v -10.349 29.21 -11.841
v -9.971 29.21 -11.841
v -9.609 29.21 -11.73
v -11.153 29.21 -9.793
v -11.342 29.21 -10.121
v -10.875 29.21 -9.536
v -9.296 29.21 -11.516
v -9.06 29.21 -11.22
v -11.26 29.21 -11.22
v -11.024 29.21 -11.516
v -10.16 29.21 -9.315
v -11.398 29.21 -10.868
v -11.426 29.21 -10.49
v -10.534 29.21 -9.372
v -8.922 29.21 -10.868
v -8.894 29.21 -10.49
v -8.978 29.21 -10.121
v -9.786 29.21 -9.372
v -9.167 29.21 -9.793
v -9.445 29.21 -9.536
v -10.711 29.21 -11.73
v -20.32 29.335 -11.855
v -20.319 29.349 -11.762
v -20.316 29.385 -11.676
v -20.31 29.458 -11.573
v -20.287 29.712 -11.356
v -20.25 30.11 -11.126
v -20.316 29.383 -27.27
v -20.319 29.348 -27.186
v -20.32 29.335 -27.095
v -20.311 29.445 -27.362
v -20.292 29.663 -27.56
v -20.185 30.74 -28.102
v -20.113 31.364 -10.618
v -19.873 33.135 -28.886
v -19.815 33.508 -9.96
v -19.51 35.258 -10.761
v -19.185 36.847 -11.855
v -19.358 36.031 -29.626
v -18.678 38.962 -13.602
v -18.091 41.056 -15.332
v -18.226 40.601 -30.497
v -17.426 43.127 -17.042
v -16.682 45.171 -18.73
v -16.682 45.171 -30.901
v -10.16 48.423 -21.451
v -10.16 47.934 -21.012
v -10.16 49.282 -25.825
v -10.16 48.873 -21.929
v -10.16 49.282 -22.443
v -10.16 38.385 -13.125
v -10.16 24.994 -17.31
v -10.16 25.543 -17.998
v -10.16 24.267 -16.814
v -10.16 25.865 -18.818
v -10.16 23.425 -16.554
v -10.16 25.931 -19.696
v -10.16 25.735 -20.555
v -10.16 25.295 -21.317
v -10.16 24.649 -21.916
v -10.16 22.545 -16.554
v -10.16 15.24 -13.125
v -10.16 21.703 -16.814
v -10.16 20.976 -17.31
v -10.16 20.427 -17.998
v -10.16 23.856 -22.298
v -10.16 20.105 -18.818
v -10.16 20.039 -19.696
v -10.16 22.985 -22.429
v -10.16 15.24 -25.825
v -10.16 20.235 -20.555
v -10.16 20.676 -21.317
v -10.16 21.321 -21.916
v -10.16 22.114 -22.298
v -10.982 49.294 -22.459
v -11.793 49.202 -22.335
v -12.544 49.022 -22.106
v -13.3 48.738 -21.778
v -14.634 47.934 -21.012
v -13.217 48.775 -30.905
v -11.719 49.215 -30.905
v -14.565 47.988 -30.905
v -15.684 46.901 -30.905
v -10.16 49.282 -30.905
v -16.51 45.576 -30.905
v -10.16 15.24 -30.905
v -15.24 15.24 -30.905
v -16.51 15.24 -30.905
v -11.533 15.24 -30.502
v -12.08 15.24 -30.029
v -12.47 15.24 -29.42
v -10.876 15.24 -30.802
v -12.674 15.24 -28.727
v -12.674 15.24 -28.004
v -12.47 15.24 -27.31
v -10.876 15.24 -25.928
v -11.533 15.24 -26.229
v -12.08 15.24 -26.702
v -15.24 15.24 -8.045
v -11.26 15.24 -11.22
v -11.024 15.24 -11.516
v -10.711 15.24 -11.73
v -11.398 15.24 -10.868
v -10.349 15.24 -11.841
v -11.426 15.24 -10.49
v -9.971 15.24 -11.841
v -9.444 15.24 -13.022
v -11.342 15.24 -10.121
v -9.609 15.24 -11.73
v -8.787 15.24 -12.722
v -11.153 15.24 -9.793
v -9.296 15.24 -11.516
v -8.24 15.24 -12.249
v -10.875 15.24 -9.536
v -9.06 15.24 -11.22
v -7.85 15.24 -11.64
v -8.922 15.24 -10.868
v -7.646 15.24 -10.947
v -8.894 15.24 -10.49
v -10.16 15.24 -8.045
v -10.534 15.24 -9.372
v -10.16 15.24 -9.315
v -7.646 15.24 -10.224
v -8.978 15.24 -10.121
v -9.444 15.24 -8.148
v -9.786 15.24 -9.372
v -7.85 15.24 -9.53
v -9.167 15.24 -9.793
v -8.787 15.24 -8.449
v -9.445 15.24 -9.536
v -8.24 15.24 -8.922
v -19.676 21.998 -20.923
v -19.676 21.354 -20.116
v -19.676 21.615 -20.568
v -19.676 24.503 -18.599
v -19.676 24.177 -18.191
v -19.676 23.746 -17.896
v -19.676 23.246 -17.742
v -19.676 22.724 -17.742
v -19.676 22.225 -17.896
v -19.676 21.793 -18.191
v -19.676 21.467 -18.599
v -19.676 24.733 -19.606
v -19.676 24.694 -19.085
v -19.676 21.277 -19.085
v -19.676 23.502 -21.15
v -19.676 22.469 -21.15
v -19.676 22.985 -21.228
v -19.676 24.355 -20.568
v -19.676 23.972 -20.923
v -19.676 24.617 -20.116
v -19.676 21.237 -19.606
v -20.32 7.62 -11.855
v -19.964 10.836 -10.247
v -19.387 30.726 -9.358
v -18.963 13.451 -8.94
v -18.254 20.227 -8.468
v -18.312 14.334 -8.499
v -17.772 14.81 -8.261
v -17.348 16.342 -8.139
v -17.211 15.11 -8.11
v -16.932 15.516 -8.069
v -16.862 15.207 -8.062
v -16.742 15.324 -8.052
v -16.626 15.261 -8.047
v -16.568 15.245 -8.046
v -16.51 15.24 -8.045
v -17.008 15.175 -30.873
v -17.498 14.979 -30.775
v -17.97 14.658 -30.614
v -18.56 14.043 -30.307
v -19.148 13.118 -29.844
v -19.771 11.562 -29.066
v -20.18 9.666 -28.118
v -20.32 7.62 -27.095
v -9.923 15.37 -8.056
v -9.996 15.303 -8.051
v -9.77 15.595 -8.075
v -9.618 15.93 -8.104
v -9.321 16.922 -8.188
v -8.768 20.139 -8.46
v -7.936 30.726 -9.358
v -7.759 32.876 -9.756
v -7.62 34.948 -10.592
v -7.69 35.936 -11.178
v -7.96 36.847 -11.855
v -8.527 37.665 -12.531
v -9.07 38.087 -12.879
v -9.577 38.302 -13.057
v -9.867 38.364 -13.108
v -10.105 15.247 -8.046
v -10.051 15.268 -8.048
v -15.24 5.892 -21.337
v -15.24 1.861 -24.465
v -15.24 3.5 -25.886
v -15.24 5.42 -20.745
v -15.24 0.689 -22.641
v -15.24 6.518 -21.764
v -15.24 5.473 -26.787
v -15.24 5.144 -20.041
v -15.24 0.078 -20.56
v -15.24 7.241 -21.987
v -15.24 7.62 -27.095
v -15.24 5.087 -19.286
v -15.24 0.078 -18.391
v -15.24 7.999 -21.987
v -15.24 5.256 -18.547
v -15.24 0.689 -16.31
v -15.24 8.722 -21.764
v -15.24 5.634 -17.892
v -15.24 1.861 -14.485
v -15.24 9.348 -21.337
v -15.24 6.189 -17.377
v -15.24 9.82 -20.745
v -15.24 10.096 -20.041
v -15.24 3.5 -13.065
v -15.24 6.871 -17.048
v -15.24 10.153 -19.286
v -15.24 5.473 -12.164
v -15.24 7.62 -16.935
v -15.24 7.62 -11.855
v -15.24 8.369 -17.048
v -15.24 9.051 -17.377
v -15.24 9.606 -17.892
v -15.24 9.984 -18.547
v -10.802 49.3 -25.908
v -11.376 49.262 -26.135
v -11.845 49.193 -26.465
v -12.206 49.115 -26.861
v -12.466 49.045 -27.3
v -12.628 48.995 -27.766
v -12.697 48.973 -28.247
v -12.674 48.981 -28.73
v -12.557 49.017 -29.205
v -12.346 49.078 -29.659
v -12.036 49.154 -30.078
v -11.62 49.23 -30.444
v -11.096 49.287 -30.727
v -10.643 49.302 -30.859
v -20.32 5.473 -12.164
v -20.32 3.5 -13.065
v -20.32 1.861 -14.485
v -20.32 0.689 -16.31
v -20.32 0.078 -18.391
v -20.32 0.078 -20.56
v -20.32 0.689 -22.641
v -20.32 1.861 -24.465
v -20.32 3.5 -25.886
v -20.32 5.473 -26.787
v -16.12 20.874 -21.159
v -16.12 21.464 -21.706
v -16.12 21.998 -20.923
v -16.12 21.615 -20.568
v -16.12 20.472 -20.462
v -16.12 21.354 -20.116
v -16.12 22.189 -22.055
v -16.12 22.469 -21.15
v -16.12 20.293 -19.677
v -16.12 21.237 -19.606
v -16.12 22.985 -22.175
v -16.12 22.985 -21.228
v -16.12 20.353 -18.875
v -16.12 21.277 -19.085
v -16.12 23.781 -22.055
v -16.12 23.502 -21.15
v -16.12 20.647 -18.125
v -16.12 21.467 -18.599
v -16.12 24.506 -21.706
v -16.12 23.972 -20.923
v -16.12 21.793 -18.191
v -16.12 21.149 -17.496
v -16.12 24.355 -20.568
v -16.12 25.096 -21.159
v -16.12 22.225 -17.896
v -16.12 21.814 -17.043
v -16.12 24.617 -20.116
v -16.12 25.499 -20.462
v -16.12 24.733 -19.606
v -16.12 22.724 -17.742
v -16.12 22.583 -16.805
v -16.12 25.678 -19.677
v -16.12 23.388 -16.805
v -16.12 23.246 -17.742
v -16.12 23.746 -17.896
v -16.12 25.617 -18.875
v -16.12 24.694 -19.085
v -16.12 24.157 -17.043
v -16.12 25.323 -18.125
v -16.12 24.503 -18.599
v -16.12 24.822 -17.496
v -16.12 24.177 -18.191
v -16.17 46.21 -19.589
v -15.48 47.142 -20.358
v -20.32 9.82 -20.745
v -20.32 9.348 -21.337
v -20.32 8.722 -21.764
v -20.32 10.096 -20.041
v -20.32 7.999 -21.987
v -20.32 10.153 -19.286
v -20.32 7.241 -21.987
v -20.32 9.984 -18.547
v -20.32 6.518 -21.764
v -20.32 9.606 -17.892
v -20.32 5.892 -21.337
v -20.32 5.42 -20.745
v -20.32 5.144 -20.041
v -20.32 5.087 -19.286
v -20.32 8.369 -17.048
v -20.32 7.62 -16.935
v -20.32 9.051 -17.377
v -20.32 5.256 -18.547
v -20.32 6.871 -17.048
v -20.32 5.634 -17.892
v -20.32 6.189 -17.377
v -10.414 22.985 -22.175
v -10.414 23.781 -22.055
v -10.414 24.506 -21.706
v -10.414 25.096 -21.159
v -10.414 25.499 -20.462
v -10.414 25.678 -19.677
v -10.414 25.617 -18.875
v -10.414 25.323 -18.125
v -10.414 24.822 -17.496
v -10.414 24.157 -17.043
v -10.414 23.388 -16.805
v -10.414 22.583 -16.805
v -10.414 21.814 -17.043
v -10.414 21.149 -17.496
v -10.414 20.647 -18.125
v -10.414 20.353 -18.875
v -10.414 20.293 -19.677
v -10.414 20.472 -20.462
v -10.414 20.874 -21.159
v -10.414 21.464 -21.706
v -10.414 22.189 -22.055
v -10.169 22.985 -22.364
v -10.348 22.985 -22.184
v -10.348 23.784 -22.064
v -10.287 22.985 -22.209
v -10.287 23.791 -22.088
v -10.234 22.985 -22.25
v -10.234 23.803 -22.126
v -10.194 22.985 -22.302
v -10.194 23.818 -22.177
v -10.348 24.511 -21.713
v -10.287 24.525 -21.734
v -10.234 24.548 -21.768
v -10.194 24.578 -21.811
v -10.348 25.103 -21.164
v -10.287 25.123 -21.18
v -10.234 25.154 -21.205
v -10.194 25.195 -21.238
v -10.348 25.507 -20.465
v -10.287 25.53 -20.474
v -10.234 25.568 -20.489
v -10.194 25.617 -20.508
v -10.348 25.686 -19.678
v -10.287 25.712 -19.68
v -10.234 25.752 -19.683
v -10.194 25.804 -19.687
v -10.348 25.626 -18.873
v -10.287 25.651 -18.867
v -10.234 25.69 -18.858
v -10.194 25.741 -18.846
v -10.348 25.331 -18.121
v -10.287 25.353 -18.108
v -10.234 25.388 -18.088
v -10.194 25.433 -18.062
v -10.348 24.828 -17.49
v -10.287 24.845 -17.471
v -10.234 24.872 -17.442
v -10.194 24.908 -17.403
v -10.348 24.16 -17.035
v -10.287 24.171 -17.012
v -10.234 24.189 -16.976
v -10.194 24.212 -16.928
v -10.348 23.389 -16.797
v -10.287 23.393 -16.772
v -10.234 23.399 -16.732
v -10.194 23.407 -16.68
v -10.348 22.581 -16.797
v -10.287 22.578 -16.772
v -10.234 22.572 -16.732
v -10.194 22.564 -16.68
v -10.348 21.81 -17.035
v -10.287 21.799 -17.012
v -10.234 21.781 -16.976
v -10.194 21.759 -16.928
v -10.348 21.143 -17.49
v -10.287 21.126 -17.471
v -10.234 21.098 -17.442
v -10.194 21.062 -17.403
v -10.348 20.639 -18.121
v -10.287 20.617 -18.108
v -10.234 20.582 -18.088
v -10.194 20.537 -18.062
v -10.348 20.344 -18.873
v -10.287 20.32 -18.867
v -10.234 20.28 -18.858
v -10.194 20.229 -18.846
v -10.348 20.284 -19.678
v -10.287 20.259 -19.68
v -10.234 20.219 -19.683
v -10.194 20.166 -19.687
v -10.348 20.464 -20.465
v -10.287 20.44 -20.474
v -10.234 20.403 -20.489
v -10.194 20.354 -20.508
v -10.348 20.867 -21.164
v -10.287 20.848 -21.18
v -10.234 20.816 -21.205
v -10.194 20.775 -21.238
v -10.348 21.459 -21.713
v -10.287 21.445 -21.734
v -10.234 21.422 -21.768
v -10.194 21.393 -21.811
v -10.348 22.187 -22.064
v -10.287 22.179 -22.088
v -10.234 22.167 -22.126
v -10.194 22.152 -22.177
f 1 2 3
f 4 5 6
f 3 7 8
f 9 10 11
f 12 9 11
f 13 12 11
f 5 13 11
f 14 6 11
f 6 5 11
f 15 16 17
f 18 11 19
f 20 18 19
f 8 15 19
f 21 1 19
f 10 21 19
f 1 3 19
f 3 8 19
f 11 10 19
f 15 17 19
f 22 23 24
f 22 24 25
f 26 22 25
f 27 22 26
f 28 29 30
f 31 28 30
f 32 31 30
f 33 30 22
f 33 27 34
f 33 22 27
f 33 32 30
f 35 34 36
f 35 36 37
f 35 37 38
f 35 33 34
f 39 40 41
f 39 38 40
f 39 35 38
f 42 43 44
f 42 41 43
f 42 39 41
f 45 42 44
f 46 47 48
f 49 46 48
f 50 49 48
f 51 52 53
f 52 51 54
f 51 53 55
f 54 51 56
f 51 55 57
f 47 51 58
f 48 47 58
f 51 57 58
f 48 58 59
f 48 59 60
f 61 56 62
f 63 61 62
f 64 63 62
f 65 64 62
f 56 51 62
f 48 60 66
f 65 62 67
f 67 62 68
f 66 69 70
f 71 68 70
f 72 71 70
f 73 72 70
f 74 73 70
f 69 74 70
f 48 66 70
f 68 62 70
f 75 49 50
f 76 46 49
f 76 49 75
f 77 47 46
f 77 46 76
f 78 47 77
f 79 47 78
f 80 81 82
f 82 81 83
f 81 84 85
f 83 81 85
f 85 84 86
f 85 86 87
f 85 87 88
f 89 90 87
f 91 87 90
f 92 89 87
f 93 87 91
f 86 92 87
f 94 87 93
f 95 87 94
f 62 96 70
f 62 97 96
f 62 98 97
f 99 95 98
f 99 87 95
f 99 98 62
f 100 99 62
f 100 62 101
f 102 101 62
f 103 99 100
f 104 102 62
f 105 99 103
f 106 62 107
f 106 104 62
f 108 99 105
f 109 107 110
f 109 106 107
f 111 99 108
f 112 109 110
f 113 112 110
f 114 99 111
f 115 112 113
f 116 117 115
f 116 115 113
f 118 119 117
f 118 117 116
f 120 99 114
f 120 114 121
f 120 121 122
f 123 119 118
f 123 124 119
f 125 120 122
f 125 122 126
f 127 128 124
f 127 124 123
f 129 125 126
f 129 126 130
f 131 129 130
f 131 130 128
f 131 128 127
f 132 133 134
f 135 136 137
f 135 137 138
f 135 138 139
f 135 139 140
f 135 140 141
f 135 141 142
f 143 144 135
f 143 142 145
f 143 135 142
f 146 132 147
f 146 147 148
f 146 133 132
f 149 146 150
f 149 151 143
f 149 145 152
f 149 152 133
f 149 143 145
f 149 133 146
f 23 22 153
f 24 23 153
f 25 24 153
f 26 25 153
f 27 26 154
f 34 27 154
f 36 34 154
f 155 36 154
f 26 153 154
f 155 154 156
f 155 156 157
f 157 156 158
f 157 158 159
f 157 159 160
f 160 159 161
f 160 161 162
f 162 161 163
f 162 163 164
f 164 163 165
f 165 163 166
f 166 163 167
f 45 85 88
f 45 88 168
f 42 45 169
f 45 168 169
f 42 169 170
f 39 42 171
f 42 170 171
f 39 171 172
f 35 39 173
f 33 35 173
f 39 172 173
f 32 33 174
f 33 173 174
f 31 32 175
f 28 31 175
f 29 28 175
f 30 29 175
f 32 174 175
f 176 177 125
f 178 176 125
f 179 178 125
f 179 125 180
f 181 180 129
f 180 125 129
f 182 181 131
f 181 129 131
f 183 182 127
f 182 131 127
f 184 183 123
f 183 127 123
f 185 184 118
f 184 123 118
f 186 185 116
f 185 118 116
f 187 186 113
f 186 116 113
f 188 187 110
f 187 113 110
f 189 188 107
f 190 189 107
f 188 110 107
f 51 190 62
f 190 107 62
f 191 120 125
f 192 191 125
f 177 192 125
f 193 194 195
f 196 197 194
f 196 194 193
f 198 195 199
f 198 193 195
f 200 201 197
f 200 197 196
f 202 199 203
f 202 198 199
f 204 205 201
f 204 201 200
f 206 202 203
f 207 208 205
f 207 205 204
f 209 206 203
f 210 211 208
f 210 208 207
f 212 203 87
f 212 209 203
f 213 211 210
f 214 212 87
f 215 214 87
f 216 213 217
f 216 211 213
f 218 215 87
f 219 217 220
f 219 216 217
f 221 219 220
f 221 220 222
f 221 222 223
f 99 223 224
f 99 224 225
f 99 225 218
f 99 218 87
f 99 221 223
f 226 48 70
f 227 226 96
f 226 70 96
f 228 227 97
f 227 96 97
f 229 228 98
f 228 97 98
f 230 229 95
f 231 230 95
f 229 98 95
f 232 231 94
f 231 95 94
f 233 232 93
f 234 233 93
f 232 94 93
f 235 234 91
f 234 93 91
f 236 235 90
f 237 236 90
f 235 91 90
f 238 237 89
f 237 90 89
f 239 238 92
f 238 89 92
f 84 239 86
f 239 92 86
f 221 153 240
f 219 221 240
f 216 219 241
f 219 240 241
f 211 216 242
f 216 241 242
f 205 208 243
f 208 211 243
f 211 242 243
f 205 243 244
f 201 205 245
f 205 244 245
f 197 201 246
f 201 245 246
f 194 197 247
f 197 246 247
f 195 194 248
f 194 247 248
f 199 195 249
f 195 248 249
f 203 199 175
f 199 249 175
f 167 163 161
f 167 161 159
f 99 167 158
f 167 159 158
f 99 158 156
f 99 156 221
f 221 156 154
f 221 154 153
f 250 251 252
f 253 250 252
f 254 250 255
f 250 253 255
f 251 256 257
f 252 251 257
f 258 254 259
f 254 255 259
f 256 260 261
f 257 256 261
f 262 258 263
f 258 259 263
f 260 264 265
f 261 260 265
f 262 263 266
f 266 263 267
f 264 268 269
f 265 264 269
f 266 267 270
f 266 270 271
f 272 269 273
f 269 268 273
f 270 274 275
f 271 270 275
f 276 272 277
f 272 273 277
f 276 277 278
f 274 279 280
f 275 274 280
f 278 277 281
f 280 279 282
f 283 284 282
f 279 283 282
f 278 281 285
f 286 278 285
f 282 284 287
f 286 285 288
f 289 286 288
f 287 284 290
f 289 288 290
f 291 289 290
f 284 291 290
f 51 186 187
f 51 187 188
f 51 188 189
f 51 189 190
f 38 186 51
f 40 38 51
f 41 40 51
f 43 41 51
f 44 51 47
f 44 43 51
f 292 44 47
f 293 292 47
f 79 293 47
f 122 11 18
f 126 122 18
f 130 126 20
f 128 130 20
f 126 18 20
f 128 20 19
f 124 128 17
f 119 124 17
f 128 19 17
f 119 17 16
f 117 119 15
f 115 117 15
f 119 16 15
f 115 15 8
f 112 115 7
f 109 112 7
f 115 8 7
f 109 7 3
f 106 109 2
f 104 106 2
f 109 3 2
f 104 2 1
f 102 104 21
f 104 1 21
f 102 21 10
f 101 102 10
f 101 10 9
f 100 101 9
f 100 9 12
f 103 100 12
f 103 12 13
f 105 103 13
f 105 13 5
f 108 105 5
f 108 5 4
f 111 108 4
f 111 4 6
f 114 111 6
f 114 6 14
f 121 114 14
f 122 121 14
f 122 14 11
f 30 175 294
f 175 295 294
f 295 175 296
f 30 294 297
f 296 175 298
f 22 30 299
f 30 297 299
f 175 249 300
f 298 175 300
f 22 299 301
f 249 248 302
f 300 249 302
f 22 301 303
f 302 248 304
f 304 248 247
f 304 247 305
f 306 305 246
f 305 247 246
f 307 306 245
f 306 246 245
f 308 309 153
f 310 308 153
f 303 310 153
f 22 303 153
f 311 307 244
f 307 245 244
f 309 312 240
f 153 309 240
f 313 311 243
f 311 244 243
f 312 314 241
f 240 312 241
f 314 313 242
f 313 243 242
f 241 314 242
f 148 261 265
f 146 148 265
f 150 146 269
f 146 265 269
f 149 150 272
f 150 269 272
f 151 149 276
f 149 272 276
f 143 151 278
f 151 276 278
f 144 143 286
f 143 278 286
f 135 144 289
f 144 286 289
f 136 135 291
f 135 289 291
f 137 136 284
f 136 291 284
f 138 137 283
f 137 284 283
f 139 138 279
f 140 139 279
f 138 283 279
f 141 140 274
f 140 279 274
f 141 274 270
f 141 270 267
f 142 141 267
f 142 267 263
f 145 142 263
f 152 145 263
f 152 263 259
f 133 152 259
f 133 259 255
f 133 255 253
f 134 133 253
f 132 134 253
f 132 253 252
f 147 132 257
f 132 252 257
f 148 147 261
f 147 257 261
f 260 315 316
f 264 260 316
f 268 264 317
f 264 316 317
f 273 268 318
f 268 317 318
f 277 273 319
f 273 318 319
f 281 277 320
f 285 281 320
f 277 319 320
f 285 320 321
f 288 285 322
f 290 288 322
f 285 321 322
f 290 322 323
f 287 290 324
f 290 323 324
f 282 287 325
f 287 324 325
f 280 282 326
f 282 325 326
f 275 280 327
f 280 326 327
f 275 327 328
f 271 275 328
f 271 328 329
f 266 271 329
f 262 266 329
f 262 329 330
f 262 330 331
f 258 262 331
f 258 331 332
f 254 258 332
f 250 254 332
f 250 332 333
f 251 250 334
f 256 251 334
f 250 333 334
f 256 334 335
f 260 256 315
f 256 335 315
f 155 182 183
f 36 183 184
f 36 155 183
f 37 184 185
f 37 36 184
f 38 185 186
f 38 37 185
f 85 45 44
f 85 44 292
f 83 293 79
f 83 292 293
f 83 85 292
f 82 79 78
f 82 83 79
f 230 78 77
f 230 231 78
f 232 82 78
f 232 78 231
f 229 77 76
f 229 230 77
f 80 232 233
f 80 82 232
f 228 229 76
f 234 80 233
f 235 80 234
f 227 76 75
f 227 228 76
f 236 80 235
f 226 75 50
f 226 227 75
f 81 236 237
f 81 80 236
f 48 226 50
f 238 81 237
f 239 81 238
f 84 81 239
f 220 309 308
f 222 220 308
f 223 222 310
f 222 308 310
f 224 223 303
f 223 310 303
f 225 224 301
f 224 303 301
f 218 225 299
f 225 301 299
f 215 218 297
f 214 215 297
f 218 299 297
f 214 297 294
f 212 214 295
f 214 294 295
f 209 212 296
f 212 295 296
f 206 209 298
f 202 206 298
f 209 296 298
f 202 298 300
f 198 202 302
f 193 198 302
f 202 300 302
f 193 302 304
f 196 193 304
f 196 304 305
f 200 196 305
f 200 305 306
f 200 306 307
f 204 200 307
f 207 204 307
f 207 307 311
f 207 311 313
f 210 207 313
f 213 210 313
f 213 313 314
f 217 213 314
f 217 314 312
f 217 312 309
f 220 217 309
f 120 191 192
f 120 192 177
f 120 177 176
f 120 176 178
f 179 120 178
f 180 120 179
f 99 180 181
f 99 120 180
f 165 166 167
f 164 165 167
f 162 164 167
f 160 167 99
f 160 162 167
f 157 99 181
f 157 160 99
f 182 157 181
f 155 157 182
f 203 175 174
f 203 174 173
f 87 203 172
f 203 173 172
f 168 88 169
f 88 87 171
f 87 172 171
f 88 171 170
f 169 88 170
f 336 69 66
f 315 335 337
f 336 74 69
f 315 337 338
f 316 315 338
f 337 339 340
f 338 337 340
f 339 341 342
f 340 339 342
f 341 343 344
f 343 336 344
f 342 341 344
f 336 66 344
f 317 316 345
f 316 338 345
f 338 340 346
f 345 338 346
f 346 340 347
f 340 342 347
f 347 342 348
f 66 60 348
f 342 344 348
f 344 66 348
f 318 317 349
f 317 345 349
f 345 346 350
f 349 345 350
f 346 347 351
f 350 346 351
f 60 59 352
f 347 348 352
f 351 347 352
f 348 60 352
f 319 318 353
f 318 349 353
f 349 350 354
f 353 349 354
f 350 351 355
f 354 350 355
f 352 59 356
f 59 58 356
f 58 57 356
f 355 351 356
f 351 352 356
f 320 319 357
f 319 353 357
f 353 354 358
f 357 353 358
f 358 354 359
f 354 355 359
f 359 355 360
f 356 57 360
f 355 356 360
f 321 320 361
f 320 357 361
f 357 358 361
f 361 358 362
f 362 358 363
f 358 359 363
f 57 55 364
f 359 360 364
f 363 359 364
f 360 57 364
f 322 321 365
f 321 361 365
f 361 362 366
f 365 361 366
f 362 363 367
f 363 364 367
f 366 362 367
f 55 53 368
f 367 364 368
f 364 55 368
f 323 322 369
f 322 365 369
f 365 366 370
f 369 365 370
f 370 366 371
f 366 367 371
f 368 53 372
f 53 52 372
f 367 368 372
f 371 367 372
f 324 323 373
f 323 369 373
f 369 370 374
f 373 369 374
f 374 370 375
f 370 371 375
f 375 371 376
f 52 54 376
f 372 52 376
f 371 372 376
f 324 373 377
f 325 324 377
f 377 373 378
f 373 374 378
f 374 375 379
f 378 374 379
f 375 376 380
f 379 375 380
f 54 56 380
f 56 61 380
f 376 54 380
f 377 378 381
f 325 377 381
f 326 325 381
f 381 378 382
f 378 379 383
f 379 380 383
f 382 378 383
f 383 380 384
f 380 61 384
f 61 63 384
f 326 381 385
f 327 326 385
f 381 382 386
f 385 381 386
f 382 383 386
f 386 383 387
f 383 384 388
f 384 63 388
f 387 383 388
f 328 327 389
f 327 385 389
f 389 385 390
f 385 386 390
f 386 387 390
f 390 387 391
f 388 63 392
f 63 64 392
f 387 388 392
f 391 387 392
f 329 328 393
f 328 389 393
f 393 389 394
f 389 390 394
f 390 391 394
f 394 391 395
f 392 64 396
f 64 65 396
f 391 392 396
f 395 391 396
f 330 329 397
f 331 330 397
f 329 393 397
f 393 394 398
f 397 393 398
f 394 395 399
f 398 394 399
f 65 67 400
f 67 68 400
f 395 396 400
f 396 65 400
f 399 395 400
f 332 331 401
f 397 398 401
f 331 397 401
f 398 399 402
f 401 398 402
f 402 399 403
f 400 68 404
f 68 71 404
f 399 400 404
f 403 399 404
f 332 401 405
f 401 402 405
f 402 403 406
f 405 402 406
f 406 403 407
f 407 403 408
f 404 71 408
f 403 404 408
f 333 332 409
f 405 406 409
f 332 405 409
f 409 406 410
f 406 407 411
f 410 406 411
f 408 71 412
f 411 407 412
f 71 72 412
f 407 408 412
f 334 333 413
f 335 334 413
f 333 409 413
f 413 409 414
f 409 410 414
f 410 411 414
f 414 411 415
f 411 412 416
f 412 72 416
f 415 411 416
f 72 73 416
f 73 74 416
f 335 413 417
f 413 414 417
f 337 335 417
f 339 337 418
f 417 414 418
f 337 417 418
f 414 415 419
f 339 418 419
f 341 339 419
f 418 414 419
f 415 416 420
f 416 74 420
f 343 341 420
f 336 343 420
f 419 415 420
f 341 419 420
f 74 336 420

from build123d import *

# Parameters (mm, degrees)
BOSS_EXTRUDE1_DEPTH = 50.8
CUT_EXTRUDE2_START  = -21.59
SKETCH3_R           = 1.27
CUT_EXTRUDE2_DEPTH  = 50.8
CUT_EXTRUDE1_DEPTH  = 50.8
SKETCH4_W           = 10.16
SKETCH4_H           = 15.24
CUT_EXTRUDE3_DEPTH  = 50.8
SKETCH5_R           = 2.54
CUT_EXTRUDE5_DEPTH  = 50.8
CUT_EXTRUDE6_DEPTH  = 32.512
CUT_EXTRUDE7_DEPTH  = 32.512
CUT_EXTRUDE12_START = -10.16
SKETCH14_R          = 2.7
CUT_EXTRUDE12_DEPTH = 9.08
CUT_EXTRUDE9_DEPTH  = 38.608
BOSS_EXTRUDE2_START = -4.2
SKETCH15_R          = 2.7
BOSS_EXTRUDE2_DEPTH = 4.2
FILLET1_R           = 0.254
SKETCH16_R          = 1.7526
CUT_EXTRUDE13_DEPTH = 3.556


with BuildPart() as part:
    # Sketch1 → Boss-Extrude1 (new body)
    with BuildSketch(Plane(origin=(0, 0, 0), x_dir=(1, 0, 0), z_dir=(0, 1, 0))):
        with BuildLine():
            Line((-20.32, 27.095319289), (-20.32, 11.855319289))
            ThreePointArc((-20.32, 11.855319289), (-19.204076836, 9.161242453), (-16.51, 8.045319289))
            Line((-16.51, 8.045319289), (-3.81, 8.045319289))
            ThreePointArc((-3.81, 8.045319289), (-1.115923164, 9.161242453), (0, 11.855319289))
            Line((0, 11.855319289), (0, 27.095319289))
            ThreePointArc((0, 27.095319289), (-1.115923164, 29.789396126), (-3.81, 30.905319289))
            Line((-3.81, 30.905319289), (-16.51, 30.905319289))
            ThreePointArc((-16.51, 30.905319289), (-19.204076836, 29.789396126), (-20.32, 27.095319289))
        make_face()
    extrude(amount=BOSS_EXTRUDE1_DEPTH)

    # Sketch3 → Cut-Extrude2 (cut)
    with BuildSketch(Plane(origin=(0, 50.8, 0), x_dir=(1, 0, 0), z_dir=(0, 1, 0)).offset(CUT_EXTRUDE2_START)):
        with Locations(Location((-10.16, 10.585319289, 0), (0, 0, 270))):
            Circle(SKETCH3_R)
        with Locations(Location((-10.16, 28.365319289, 0), (0, 0, 270))):
            Circle(SKETCH3_R)
    extrude(amount=-CUT_EXTRUDE2_DEPTH, mode=Mode.SUBTRACT)

    # Sketch2 → Cut-Extrude1 (cut)
    with BuildSketch(Plane.ZY.offset(20.32)):
        with BuildLine():
            Line((-27.095319289, 7.62), (-30.905319289, 15.24))
            Line((-30.905319289, 15.24), (-30.905319289, -5.08))
            Line((-30.905319289, -5.08), (-8.045319289, -5.08))
            Line((-8.045319289, -5.08), (-8.045319289, 15.24))
            Line((-8.045319289, 15.24), (-11.855319289, 7.62))
            ThreePointArc((-11.855319289, 7.62), (-19.475319289, 0), (-27.095319289, 7.62))
        make_face()
    extrude(amount=-CUT_EXTRUDE1_DEPTH, mode=Mode.SUBTRACT)

    # Sketch4 → Cut-Extrude3 (cut)
    with BuildSketch(Plane.XY.offset(-8.045319289)):
        with Locations((-10.16, 7.62)):
            Rectangle(SKETCH4_W, SKETCH4_H)
    extrude(amount=-CUT_EXTRUDE3_DEPTH, mode=Mode.SUBTRACT)

    # Sketch5 → Cut-Extrude5 (cut)
    with BuildSketch(Plane.ZY.offset(20.32)):
        with Locations((-19.475319289, 7.62)):
            Circle(SKETCH5_R)
    extrude(amount=-CUT_EXTRUDE5_DEPTH, mode=Mode.SUBTRACT)

    # Sketch6 → Cut-Extrude6 (cut)
    with BuildSketch(Plane.ZY.offset(20.32)):
        with BuildLine():
            Line((-11.855319289, 36.846817341), (-21.012334943, 47.93447962))
            ThreePointArc((-21.012334943, 47.93447962), (-23.733254983, 50.047756788), (-27.095319289, 50.8))
            Line((-27.095319289, 50.8), (-31.52544936, 50.8))
            Line((-31.52544936, 50.8), (-31.52544936, 15.08846866))
            Line((-31.52544936, 15.08846866), (-40.392656277, 51.934271372))
            Line((-40.392656277, 51.934271372), (12.273740193, 71.26134954))
            Line((12.273740193, 71.26134954), (-8.045319289, 15.24))
            Line((-8.045319289, 15.24), (-9.357524517, 30.725540243))
            ThreePointArc((-9.357524517, 30.725540243), (-10.139323425, 33.97677891), (-11.855319289, 36.846817341))
        make_face()
    extrude(amount=-CUT_EXTRUDE6_DEPTH, mode=Mode.SUBTRACT)

    # Sketch7 → Cut-Extrude7 (cut)
    with BuildSketch(Plane(origin=(0, 0, -30.905319289), x_dir=(-1, 0, 0), z_dir=(0, 0, -1))):
        with BuildLine():
            Line((0, 29.335182296), (-12.852337187, 67.804770192))
            Line((-12.852337187, 67.804770192), (37.594938904, 66.861563092))
            Line((37.594938904, 66.861563092), (20.32, 29.335182296))
            ThreePointArc((20.32, 29.335182296), (19.06442366, 37.382371637), (16.68228589, 45.170769925))
            ThreePointArc((16.68228589, 45.170769925), (10.662952429, 49.301878805), (4.643618968, 45.170769925))
            ThreePointArc((4.643618968, 45.170769925), (1.994617848, 37.348921605), (0, 29.335182296))
        make_face()
    extrude(amount=-CUT_EXTRUDE7_DEPTH, mode=Mode.SUBTRACT)

    # Sketch14 → Cut-Extrude12 (cut)
    with BuildSketch(Plane(origin=(0, 0, 0), x_dir=(0, 0, -1), z_dir=(1, 0, 0)).offset(CUT_EXTRUDE12_START)):
        with Locations((19.475319289, 22.985182296)):
            Circle(SKETCH14_R)
    extrude(amount=-CUT_EXTRUDE12_DEPTH, mode=Mode.SUBTRACT)

    # Sketch8 → Cut-Extrude9 (cut, symmetric)
    with BuildSketch(Plane.XZ.offset(-15.24)):
        with BuildLine():
            Line((-10.16, -13.125319289), (-10.16, -25.825319289))
            ThreePointArc((-10.16, -25.825319289), (-12.7, -28.365319289), (-10.16, -30.905319289))
            Line((-10.16, -30.905319289), (15.115555145, -54.006547143))
            Line((15.115555145, -54.006547143), (12.290345115, 18.720711385))
            Line((12.290345115, 18.720711385), (-10.16, -8.045319289))
            ThreePointArc((-10.16, -8.045319289), (-7.62, -10.585319289), (-10.16, -13.125319289))
        make_face()
    extrude(amount=CUT_EXTRUDE9_DEPTH, both=True, mode=Mode.SUBTRACT)

    # Sketch15 → Boss-Extrude2 (add)
    with BuildSketch(Plane.ZY.offset(20.32).offset(BOSS_EXTRUDE2_START)):
        with Locations((-19.475319289, 22.985182296)):
            Circle(SKETCH15_R)
    extrude(amount=BOSS_EXTRUDE2_DEPTH)

    # Fillet1
    fillet1_edges = [part.edges().sort_by_distance(p)[0] for p in [
        (-10.16, 22.985182296, -16.775319289),
    ]]
    fillet(fillet1_edges, radius=FILLET1_R)

    # Sketch16 → Cut-Extrude13 (cut)
    with BuildSketch(Plane(origin=(-16.12, 0, 0), x_dir=(0, 0, -1), z_dir=(1, 0, 0))):
        with Locations((19.475319289, 22.985182296)):
            Circle(SKETCH16_R)
    extrude(amount=-CUT_EXTRUDE13_DEPTH, mode=Mode.SUBTRACT)


solid = part.part
